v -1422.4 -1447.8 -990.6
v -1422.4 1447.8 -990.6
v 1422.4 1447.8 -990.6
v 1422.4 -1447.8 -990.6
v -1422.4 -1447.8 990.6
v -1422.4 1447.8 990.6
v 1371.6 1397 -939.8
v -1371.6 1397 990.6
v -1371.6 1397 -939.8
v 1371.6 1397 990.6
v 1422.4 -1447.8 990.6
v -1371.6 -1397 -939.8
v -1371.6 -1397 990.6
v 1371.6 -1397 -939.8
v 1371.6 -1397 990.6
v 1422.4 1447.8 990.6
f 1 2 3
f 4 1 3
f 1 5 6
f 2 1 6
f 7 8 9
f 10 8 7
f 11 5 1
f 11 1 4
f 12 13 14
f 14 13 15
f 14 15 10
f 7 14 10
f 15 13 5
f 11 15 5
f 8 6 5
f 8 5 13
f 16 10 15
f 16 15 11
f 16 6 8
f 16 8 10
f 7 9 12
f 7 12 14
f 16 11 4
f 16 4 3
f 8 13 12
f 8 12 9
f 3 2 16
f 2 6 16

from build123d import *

# Parameters (mm, degrees)
F0_W     = 2844.8
F0_H     = 2895.6
F1_DEPTH = 990.6
F2_T     = -50.8


with BuildPart() as f1:
    # F0 (on Top) → F1 (new body, symmetric)
    with BuildSketch(Plane.XY):
        Rectangle(F0_W, F0_H)
    extrude(amount=F1_DEPTH, both=True)

    # F2
    f2_openings = [f1.faces().sort_by_distance(p)[0] for p in [
        (0, 0, 990.6),
    ]]
    offset(amount=F2_T, openings=f2_openings)


solid = f1.part
